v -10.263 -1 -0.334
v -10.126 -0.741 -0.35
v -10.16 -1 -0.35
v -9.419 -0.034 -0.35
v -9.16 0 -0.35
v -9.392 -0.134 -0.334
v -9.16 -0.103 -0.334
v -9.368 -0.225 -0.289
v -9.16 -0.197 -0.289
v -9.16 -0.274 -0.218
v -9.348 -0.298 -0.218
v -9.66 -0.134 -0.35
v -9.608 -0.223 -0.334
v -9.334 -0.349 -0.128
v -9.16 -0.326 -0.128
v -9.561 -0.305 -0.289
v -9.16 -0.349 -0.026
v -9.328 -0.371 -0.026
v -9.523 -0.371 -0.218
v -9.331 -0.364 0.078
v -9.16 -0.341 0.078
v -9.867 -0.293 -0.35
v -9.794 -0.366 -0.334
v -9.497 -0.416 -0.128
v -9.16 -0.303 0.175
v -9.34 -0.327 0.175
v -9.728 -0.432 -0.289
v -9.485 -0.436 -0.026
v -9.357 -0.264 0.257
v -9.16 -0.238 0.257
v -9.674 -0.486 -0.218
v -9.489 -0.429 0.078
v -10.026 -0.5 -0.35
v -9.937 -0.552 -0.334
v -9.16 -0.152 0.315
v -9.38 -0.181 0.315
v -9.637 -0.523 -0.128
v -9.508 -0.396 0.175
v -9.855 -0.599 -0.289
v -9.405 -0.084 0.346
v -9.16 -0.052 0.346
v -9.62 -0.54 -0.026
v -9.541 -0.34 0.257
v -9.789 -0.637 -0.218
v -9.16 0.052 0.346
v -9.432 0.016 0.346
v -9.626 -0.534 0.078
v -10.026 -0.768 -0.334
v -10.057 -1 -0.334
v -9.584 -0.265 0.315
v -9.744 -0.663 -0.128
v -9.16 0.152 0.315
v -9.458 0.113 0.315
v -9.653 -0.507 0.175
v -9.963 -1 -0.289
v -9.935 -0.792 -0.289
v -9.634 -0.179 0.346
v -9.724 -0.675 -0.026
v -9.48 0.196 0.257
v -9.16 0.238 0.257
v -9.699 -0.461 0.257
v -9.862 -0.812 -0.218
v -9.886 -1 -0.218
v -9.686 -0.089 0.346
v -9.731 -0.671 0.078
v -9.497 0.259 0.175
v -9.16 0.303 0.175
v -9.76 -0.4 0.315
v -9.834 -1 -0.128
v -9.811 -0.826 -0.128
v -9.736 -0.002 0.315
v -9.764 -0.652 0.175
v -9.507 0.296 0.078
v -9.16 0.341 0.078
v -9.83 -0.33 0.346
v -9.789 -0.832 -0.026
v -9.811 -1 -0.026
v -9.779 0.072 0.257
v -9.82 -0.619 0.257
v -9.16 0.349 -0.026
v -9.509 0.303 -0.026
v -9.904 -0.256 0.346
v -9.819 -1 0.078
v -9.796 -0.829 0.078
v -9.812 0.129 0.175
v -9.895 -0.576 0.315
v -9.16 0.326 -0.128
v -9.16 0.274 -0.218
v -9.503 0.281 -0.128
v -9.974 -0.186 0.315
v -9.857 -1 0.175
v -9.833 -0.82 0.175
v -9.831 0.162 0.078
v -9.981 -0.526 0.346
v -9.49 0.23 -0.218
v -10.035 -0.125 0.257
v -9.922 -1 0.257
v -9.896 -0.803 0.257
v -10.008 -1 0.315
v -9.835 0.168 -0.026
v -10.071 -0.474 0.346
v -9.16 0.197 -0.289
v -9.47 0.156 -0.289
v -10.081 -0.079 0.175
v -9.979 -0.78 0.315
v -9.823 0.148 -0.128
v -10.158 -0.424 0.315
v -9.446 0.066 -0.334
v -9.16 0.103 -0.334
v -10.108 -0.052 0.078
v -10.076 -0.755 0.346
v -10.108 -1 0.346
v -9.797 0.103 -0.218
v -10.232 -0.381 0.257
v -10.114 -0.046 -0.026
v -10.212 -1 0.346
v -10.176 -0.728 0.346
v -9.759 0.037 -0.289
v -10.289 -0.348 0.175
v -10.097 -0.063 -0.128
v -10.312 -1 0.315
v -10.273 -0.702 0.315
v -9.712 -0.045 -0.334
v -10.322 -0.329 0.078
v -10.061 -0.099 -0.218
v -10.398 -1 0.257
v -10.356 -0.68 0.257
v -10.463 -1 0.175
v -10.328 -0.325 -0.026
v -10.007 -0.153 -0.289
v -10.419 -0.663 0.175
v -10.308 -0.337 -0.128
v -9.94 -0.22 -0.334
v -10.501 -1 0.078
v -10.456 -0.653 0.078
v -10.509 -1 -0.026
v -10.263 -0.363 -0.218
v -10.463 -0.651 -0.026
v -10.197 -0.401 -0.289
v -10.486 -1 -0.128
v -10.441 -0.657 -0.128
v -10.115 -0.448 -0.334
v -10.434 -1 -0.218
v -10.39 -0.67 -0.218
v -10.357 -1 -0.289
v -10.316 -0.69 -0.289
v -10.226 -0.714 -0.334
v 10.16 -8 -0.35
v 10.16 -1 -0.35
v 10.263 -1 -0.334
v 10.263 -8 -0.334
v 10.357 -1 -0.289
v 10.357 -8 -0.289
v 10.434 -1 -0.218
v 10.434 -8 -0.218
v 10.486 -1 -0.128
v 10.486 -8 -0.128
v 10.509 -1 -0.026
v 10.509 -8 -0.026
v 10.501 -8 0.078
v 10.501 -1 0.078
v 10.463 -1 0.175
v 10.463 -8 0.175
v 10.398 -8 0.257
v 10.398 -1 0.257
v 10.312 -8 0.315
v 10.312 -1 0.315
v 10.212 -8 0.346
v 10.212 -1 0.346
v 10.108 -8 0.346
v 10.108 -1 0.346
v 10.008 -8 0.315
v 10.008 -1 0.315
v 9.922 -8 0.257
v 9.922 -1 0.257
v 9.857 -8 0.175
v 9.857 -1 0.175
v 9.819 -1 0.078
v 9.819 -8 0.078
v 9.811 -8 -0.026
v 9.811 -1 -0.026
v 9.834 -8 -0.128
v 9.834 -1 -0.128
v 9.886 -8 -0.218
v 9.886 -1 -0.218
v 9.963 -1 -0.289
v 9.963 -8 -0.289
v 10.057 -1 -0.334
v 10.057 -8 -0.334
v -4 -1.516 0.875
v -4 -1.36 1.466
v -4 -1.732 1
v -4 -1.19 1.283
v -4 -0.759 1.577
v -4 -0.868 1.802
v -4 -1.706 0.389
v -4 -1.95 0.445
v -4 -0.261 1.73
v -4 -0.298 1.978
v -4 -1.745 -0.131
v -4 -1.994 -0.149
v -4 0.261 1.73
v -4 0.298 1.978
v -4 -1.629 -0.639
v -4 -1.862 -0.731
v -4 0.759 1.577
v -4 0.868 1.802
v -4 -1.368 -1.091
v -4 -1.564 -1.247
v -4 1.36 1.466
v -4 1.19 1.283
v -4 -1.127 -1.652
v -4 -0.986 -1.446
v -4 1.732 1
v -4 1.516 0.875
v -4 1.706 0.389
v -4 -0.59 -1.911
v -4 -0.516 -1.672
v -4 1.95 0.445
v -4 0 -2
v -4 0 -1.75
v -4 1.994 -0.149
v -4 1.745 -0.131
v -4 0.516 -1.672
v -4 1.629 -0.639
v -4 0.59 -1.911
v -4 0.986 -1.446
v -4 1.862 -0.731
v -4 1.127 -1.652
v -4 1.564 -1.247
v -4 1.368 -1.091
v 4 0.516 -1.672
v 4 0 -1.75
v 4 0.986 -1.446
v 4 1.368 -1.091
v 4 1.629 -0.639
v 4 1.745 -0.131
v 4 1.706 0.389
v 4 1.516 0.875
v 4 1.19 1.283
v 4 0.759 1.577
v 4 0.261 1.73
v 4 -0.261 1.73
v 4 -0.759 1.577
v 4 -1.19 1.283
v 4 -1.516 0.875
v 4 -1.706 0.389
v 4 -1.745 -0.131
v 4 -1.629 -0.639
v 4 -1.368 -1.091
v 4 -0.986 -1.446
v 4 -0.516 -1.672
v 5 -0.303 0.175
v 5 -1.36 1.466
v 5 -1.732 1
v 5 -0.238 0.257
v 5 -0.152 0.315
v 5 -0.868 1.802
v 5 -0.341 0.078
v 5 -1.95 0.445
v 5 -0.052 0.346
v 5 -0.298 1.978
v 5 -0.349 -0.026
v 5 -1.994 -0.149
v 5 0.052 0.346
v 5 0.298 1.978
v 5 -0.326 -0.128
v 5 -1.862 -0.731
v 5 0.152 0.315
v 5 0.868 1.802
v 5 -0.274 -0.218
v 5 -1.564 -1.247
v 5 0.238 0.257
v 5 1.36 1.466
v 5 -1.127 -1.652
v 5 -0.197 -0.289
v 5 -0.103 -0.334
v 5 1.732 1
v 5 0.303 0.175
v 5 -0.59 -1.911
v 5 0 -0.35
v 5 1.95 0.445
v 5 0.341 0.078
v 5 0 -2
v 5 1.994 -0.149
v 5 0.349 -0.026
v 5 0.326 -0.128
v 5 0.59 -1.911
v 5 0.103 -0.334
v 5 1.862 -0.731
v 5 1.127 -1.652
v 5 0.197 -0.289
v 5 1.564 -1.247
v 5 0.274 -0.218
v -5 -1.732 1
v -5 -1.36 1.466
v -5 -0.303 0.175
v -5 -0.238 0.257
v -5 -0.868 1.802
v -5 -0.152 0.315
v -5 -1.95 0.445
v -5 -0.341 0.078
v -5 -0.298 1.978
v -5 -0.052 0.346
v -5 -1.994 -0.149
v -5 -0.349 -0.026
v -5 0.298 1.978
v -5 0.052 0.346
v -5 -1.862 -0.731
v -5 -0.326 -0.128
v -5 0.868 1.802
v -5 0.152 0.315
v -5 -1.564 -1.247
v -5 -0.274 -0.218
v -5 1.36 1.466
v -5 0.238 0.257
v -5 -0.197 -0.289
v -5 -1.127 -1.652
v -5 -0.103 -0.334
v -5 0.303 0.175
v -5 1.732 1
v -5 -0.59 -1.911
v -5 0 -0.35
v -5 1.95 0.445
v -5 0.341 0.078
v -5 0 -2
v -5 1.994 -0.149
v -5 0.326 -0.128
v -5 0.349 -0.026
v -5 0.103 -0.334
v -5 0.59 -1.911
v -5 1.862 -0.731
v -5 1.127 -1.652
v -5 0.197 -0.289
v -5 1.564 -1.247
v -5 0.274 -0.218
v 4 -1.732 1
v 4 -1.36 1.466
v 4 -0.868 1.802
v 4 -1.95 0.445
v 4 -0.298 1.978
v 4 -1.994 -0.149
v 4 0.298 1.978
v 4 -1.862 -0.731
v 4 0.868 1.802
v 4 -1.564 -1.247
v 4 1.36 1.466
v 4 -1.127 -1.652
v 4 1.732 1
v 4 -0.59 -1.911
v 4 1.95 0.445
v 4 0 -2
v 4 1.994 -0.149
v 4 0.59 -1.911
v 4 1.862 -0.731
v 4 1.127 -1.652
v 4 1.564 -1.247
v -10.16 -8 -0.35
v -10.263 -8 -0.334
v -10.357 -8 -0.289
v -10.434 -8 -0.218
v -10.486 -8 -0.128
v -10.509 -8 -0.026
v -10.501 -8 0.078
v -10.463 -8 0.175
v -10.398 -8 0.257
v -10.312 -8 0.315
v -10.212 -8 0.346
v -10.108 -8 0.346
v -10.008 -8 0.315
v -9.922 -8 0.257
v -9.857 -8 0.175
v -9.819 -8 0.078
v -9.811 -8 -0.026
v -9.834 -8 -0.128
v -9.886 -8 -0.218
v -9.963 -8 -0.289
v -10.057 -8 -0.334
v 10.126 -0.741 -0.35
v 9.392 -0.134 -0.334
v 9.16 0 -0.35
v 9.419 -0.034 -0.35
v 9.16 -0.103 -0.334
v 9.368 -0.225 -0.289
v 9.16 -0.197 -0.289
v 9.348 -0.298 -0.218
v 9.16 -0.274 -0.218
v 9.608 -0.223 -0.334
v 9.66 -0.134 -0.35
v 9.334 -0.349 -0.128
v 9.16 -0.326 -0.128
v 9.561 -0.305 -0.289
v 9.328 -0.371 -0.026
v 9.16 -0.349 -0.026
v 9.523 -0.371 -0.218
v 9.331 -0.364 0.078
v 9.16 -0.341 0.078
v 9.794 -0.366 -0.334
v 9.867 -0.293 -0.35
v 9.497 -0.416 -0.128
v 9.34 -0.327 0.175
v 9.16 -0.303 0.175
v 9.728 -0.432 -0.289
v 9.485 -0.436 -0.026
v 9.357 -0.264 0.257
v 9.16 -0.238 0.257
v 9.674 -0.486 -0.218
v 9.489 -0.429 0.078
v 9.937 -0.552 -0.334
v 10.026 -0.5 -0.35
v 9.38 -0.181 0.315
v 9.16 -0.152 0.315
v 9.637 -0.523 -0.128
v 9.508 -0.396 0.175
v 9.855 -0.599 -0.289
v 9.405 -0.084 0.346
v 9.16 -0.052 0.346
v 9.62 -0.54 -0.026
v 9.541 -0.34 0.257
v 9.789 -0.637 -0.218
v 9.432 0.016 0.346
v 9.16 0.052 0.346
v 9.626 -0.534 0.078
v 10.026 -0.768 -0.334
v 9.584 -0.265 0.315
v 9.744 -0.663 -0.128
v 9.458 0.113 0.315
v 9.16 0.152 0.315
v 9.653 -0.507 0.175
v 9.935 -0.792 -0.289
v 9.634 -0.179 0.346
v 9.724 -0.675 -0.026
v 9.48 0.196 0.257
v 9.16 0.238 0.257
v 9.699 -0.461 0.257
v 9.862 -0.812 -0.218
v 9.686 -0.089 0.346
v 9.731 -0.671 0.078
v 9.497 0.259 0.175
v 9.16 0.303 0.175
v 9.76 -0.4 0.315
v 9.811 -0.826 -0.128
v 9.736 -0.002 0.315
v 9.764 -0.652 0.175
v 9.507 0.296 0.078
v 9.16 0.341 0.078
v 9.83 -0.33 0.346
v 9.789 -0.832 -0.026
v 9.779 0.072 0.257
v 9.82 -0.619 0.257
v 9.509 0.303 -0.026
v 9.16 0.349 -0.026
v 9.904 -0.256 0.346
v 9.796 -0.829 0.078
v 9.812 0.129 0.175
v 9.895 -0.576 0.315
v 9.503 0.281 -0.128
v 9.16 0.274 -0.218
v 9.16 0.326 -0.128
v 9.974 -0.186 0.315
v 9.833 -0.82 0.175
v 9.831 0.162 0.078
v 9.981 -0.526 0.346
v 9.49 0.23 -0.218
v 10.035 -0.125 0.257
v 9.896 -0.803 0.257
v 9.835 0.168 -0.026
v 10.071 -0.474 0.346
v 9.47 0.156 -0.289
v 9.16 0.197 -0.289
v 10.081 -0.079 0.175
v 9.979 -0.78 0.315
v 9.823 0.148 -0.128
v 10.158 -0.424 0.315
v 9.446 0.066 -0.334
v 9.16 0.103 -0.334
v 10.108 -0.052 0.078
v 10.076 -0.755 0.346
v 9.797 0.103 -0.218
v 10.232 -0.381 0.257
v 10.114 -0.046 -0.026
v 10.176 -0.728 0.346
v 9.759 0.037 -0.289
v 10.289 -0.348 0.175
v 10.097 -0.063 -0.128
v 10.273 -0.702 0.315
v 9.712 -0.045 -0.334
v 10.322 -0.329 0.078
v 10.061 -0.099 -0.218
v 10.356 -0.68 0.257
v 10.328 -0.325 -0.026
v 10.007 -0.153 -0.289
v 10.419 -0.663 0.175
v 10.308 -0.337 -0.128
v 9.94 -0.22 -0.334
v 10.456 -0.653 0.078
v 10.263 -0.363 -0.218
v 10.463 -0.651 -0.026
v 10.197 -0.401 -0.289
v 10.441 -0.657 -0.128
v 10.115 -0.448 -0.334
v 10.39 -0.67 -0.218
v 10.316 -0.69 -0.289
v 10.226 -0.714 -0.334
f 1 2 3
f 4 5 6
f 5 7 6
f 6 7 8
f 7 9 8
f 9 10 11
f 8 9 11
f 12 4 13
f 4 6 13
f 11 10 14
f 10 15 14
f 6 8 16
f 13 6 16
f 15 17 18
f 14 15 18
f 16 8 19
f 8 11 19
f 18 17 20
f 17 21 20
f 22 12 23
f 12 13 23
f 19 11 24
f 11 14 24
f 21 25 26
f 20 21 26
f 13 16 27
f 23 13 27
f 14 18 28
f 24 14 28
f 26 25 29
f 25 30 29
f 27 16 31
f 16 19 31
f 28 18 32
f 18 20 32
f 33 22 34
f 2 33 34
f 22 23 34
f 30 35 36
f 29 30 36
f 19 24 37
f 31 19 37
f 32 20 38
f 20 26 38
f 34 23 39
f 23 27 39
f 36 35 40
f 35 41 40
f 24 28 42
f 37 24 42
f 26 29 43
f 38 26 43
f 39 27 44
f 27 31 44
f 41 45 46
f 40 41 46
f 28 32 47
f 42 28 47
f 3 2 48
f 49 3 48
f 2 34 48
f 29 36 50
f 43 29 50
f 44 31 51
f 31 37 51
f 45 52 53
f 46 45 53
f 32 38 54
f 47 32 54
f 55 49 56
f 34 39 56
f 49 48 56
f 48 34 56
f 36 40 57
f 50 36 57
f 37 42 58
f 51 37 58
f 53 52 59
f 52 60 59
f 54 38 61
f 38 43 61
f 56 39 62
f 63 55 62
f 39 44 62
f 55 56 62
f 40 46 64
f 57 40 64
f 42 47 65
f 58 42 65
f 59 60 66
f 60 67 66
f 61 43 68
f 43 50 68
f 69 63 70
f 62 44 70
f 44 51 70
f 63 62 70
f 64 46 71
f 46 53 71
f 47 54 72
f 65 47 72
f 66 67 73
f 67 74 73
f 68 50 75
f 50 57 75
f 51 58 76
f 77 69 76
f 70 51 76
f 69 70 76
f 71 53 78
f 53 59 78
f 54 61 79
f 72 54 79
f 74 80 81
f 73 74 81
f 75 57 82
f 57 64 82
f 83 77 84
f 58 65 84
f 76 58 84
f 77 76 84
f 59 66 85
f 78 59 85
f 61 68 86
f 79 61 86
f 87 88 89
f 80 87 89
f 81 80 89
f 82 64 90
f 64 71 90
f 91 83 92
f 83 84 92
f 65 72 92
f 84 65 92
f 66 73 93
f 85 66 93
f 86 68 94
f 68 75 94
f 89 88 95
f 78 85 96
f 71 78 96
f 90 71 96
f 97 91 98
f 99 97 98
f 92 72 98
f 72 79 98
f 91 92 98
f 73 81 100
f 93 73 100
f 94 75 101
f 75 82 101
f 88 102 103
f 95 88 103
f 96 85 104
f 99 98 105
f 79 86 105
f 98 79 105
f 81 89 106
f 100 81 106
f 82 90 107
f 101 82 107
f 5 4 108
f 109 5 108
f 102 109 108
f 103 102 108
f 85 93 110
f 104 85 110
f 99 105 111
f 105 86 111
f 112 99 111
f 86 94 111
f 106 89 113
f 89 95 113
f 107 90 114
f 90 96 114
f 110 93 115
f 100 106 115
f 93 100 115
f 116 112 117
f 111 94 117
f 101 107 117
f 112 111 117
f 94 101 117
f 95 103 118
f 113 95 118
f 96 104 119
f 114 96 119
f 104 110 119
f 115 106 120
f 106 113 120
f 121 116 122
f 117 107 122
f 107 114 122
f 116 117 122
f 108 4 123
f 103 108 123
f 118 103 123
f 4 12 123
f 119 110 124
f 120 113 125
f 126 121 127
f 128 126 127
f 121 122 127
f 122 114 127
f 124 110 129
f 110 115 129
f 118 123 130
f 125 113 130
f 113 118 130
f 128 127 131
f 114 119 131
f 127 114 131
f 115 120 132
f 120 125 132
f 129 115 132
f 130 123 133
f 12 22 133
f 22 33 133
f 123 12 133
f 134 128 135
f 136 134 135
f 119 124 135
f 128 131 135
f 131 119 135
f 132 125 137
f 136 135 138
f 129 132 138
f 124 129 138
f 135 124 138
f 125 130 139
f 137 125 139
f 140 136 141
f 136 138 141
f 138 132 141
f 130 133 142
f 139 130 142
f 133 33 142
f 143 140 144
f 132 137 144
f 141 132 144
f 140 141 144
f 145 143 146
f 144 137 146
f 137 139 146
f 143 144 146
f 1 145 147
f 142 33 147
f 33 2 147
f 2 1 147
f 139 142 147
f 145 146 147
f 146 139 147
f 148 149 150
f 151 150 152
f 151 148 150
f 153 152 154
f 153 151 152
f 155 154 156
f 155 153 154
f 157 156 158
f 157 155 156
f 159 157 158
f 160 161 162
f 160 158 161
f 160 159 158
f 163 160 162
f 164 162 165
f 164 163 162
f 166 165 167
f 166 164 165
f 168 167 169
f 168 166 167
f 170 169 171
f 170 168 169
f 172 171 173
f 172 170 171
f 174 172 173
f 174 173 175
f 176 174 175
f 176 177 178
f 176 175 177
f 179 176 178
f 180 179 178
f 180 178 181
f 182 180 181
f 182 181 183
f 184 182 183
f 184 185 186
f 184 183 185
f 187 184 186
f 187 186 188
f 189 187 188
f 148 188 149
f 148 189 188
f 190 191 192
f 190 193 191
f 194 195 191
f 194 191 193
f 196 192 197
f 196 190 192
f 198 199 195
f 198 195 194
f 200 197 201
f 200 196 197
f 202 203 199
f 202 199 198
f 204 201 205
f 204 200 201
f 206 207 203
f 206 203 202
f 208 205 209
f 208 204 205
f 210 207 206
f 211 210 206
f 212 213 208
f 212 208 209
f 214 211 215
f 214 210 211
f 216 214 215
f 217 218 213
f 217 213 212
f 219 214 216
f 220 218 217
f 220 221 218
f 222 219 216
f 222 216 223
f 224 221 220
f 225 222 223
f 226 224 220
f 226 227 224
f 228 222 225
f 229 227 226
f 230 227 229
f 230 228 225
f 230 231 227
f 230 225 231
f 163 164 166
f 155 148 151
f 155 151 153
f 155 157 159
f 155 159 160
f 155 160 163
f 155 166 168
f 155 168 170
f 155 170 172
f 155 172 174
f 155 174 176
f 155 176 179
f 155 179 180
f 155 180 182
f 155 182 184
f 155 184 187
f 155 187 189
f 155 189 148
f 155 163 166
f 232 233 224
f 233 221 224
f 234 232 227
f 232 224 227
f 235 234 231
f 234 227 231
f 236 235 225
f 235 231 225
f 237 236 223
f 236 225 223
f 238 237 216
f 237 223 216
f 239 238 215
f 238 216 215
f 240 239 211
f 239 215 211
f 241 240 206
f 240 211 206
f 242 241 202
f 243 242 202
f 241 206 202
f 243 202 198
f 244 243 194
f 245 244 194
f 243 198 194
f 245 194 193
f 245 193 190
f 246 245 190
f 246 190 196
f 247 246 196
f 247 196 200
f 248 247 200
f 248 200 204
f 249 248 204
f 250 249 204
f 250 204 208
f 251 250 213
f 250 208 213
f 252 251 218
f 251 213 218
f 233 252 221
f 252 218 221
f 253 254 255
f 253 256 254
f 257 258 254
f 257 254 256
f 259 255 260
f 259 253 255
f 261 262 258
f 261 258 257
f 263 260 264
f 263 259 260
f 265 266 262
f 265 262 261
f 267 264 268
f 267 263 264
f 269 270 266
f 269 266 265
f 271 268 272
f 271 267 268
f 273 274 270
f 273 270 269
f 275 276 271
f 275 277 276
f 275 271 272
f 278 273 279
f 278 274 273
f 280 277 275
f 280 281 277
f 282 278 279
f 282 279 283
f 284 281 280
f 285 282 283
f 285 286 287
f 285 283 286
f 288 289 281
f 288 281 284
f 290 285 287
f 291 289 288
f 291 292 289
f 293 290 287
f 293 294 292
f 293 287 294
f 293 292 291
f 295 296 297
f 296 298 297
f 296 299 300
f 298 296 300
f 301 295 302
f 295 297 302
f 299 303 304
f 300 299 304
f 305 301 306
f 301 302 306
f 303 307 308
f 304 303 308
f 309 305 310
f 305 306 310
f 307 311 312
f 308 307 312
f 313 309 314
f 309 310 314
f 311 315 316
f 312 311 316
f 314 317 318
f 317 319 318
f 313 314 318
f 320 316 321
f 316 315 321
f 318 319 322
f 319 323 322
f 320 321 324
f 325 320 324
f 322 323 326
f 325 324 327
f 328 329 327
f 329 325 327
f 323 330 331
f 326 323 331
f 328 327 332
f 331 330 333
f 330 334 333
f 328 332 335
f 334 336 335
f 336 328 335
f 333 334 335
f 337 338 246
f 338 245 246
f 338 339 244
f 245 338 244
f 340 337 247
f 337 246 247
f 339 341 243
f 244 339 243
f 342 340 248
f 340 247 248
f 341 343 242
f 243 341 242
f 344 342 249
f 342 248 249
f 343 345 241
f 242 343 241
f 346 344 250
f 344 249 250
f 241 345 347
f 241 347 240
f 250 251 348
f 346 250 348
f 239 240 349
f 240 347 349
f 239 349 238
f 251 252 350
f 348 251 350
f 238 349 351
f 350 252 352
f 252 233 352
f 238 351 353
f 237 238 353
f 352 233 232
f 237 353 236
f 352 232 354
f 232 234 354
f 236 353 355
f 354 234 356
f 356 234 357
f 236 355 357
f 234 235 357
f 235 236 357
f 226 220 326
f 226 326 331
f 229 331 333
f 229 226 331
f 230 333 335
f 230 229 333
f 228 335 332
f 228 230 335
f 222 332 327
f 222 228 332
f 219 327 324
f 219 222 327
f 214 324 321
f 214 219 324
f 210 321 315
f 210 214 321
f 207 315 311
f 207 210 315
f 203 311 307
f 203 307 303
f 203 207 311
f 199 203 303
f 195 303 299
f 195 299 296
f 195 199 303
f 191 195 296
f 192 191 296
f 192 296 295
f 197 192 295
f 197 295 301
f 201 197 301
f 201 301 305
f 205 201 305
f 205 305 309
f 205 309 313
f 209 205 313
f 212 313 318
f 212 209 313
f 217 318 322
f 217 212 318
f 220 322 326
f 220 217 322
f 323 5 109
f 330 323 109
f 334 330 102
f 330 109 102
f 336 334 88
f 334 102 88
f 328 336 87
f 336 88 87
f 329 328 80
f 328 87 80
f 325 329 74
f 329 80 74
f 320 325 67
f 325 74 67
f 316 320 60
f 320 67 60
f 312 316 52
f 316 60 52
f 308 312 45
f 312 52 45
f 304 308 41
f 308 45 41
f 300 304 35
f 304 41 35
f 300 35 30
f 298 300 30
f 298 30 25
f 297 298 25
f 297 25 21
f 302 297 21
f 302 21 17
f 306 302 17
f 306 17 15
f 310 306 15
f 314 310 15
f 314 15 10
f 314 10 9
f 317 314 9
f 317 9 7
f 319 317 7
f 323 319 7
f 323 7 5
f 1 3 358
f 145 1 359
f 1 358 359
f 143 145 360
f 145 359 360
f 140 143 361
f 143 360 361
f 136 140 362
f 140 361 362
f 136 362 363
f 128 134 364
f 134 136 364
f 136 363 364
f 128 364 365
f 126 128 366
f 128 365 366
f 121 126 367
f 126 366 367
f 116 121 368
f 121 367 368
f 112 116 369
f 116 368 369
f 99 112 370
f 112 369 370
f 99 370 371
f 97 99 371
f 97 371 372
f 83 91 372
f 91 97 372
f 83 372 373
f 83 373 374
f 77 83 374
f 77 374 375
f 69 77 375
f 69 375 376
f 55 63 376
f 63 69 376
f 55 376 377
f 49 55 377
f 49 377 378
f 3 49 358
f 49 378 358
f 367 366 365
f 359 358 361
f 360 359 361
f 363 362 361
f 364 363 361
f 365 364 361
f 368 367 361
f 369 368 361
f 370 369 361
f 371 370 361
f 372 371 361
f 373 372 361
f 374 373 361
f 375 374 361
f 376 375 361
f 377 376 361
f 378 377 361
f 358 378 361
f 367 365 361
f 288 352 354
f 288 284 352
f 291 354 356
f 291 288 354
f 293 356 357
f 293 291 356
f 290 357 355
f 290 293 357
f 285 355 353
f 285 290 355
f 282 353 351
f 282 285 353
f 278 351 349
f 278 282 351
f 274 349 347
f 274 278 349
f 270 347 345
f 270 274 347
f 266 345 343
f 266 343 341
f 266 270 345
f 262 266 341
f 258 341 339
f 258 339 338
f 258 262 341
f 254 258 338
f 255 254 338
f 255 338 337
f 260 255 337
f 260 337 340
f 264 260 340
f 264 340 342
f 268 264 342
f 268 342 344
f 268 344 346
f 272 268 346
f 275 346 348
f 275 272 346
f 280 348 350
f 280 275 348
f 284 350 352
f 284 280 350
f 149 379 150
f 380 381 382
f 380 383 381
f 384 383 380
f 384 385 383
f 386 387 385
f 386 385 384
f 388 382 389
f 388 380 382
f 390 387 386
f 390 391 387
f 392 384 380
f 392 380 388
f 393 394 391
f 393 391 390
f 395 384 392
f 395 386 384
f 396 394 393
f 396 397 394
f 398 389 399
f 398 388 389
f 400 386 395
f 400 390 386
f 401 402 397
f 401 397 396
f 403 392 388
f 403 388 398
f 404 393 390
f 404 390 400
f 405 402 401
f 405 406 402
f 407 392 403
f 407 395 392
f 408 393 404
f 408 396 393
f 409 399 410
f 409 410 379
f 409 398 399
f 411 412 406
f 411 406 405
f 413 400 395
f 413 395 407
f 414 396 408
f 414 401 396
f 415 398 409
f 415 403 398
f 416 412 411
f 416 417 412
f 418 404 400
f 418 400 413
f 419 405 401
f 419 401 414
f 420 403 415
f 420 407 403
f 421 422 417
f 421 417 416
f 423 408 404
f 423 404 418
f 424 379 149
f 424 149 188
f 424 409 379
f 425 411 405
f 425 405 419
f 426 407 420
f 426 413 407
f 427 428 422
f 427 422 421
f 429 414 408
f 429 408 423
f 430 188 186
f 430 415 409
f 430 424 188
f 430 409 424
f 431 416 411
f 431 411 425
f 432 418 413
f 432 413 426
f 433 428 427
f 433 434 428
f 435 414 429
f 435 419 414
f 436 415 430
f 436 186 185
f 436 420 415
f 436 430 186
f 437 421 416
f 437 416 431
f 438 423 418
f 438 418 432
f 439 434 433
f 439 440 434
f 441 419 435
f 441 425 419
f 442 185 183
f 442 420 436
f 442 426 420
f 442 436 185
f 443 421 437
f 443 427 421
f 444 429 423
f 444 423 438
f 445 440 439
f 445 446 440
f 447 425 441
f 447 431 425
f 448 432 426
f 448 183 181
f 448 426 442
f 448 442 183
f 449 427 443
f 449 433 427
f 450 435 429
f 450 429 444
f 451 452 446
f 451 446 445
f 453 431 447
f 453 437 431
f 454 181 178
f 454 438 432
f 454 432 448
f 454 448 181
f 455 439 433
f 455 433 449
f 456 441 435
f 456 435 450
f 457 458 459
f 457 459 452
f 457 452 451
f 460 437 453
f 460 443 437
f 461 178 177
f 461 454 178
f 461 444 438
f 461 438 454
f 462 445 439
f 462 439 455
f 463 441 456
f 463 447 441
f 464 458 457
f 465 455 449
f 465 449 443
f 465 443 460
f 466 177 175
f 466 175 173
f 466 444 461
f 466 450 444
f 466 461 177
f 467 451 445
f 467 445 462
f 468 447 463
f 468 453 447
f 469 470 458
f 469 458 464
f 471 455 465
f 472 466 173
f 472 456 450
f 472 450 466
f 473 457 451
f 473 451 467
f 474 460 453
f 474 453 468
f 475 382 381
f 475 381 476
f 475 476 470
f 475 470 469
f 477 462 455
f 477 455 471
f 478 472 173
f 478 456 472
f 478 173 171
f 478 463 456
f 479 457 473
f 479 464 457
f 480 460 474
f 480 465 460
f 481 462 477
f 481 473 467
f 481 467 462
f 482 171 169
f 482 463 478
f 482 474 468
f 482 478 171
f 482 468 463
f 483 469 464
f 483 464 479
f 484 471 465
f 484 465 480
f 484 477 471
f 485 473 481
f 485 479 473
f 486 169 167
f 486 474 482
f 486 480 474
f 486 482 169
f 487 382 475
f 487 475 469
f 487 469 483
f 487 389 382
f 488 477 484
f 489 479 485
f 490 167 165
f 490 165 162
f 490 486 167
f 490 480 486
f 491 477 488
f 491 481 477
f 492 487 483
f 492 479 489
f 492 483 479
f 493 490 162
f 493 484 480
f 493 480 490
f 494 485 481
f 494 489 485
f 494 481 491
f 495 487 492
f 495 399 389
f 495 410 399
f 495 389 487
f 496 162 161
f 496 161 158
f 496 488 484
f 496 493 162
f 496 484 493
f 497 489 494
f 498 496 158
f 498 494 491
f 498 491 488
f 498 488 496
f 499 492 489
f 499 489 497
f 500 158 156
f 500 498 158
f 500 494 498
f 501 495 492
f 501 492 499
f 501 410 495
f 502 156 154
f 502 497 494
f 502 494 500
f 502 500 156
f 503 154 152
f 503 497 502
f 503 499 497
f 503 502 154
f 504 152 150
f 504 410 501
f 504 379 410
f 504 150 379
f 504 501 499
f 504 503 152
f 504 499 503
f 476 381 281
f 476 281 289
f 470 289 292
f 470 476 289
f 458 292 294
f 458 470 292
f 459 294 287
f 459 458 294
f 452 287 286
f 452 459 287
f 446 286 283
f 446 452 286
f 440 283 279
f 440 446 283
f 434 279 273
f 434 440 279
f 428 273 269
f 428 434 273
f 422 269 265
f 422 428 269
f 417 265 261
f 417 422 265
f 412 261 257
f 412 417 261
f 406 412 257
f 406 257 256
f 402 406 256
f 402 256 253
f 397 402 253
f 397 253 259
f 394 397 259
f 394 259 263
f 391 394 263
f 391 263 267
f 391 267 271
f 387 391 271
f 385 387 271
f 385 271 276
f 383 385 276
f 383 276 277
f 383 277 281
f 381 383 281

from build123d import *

# Parameters (mm, degrees)
SKETCH_1_R          = 2
EXTRUDE_1_DEPTH     = 5
SKETCH_2_R          = 0.35
SKETCH_5_R          = 2.75
SKETCH_5_R_2        = 1.75
CUT_EXTRUDE_1_DEPTH = 4


with BuildPart() as part:
    # Эскиз1 → Бобышка-Вытянуть1 (new body)
    with BuildSketch(Plane(origin=(0, 0, 0), x_dir=(0, 0, -1), z_dir=(1, 0, 0))):
        Circle(SKETCH_1_R)
    extrude_1 = extrude(amount=EXTRUDE_1_DEPTH)

    # По траектории1: sweep along a path in Эскиз3
    with BuildLine(Plane.XY) as sweep_1_path:
        Line((5, 0), (9.16, 0))
        ThreePointArc((9.16, 0), (9.867106781, -0.292893219), (10.16, -1))
        Line((10.16, -1), (10.16, -8))
    # Эскиз2 → По траектории1 (sweep)
    with BuildSketch(Plane(origin=(5, 0, 0), x_dir=(0, 0, -1), z_dir=(1, 0, 0))):
        Circle(SKETCH_2_R)
    sweep_1 = sweep(path=sweep_1_path.line)

    # Зеркальное отражение1: Бобышка-Вытянуть1, По траектории1 across Right Plane
    add(extrude_1.mirror(Plane(origin=(0, 0, 0), x_dir=(0, 0, -1), z_dir=(1, 0, 0))))
    add(sweep_1.mirror(Plane(origin=(0, 0, 0), x_dir=(0, 0, -1), z_dir=(1, 0, 0))))

    # Эскиз5 → Вырез-Вытянуть-Тонкостенный1 (cut, symmetric)
    with BuildSketch(Plane(origin=(0, 0, 0), x_dir=(0, 0, -1), z_dir=(1, 0, 0))):
        Circle(SKETCH_5_R)
        Circle(SKETCH_5_R_2, mode=Mode.SUBTRACT)
    extrude(amount=CUT_EXTRUDE_1_DEPTH, both=True, mode=Mode.SUBTRACT)


solid = part.part
